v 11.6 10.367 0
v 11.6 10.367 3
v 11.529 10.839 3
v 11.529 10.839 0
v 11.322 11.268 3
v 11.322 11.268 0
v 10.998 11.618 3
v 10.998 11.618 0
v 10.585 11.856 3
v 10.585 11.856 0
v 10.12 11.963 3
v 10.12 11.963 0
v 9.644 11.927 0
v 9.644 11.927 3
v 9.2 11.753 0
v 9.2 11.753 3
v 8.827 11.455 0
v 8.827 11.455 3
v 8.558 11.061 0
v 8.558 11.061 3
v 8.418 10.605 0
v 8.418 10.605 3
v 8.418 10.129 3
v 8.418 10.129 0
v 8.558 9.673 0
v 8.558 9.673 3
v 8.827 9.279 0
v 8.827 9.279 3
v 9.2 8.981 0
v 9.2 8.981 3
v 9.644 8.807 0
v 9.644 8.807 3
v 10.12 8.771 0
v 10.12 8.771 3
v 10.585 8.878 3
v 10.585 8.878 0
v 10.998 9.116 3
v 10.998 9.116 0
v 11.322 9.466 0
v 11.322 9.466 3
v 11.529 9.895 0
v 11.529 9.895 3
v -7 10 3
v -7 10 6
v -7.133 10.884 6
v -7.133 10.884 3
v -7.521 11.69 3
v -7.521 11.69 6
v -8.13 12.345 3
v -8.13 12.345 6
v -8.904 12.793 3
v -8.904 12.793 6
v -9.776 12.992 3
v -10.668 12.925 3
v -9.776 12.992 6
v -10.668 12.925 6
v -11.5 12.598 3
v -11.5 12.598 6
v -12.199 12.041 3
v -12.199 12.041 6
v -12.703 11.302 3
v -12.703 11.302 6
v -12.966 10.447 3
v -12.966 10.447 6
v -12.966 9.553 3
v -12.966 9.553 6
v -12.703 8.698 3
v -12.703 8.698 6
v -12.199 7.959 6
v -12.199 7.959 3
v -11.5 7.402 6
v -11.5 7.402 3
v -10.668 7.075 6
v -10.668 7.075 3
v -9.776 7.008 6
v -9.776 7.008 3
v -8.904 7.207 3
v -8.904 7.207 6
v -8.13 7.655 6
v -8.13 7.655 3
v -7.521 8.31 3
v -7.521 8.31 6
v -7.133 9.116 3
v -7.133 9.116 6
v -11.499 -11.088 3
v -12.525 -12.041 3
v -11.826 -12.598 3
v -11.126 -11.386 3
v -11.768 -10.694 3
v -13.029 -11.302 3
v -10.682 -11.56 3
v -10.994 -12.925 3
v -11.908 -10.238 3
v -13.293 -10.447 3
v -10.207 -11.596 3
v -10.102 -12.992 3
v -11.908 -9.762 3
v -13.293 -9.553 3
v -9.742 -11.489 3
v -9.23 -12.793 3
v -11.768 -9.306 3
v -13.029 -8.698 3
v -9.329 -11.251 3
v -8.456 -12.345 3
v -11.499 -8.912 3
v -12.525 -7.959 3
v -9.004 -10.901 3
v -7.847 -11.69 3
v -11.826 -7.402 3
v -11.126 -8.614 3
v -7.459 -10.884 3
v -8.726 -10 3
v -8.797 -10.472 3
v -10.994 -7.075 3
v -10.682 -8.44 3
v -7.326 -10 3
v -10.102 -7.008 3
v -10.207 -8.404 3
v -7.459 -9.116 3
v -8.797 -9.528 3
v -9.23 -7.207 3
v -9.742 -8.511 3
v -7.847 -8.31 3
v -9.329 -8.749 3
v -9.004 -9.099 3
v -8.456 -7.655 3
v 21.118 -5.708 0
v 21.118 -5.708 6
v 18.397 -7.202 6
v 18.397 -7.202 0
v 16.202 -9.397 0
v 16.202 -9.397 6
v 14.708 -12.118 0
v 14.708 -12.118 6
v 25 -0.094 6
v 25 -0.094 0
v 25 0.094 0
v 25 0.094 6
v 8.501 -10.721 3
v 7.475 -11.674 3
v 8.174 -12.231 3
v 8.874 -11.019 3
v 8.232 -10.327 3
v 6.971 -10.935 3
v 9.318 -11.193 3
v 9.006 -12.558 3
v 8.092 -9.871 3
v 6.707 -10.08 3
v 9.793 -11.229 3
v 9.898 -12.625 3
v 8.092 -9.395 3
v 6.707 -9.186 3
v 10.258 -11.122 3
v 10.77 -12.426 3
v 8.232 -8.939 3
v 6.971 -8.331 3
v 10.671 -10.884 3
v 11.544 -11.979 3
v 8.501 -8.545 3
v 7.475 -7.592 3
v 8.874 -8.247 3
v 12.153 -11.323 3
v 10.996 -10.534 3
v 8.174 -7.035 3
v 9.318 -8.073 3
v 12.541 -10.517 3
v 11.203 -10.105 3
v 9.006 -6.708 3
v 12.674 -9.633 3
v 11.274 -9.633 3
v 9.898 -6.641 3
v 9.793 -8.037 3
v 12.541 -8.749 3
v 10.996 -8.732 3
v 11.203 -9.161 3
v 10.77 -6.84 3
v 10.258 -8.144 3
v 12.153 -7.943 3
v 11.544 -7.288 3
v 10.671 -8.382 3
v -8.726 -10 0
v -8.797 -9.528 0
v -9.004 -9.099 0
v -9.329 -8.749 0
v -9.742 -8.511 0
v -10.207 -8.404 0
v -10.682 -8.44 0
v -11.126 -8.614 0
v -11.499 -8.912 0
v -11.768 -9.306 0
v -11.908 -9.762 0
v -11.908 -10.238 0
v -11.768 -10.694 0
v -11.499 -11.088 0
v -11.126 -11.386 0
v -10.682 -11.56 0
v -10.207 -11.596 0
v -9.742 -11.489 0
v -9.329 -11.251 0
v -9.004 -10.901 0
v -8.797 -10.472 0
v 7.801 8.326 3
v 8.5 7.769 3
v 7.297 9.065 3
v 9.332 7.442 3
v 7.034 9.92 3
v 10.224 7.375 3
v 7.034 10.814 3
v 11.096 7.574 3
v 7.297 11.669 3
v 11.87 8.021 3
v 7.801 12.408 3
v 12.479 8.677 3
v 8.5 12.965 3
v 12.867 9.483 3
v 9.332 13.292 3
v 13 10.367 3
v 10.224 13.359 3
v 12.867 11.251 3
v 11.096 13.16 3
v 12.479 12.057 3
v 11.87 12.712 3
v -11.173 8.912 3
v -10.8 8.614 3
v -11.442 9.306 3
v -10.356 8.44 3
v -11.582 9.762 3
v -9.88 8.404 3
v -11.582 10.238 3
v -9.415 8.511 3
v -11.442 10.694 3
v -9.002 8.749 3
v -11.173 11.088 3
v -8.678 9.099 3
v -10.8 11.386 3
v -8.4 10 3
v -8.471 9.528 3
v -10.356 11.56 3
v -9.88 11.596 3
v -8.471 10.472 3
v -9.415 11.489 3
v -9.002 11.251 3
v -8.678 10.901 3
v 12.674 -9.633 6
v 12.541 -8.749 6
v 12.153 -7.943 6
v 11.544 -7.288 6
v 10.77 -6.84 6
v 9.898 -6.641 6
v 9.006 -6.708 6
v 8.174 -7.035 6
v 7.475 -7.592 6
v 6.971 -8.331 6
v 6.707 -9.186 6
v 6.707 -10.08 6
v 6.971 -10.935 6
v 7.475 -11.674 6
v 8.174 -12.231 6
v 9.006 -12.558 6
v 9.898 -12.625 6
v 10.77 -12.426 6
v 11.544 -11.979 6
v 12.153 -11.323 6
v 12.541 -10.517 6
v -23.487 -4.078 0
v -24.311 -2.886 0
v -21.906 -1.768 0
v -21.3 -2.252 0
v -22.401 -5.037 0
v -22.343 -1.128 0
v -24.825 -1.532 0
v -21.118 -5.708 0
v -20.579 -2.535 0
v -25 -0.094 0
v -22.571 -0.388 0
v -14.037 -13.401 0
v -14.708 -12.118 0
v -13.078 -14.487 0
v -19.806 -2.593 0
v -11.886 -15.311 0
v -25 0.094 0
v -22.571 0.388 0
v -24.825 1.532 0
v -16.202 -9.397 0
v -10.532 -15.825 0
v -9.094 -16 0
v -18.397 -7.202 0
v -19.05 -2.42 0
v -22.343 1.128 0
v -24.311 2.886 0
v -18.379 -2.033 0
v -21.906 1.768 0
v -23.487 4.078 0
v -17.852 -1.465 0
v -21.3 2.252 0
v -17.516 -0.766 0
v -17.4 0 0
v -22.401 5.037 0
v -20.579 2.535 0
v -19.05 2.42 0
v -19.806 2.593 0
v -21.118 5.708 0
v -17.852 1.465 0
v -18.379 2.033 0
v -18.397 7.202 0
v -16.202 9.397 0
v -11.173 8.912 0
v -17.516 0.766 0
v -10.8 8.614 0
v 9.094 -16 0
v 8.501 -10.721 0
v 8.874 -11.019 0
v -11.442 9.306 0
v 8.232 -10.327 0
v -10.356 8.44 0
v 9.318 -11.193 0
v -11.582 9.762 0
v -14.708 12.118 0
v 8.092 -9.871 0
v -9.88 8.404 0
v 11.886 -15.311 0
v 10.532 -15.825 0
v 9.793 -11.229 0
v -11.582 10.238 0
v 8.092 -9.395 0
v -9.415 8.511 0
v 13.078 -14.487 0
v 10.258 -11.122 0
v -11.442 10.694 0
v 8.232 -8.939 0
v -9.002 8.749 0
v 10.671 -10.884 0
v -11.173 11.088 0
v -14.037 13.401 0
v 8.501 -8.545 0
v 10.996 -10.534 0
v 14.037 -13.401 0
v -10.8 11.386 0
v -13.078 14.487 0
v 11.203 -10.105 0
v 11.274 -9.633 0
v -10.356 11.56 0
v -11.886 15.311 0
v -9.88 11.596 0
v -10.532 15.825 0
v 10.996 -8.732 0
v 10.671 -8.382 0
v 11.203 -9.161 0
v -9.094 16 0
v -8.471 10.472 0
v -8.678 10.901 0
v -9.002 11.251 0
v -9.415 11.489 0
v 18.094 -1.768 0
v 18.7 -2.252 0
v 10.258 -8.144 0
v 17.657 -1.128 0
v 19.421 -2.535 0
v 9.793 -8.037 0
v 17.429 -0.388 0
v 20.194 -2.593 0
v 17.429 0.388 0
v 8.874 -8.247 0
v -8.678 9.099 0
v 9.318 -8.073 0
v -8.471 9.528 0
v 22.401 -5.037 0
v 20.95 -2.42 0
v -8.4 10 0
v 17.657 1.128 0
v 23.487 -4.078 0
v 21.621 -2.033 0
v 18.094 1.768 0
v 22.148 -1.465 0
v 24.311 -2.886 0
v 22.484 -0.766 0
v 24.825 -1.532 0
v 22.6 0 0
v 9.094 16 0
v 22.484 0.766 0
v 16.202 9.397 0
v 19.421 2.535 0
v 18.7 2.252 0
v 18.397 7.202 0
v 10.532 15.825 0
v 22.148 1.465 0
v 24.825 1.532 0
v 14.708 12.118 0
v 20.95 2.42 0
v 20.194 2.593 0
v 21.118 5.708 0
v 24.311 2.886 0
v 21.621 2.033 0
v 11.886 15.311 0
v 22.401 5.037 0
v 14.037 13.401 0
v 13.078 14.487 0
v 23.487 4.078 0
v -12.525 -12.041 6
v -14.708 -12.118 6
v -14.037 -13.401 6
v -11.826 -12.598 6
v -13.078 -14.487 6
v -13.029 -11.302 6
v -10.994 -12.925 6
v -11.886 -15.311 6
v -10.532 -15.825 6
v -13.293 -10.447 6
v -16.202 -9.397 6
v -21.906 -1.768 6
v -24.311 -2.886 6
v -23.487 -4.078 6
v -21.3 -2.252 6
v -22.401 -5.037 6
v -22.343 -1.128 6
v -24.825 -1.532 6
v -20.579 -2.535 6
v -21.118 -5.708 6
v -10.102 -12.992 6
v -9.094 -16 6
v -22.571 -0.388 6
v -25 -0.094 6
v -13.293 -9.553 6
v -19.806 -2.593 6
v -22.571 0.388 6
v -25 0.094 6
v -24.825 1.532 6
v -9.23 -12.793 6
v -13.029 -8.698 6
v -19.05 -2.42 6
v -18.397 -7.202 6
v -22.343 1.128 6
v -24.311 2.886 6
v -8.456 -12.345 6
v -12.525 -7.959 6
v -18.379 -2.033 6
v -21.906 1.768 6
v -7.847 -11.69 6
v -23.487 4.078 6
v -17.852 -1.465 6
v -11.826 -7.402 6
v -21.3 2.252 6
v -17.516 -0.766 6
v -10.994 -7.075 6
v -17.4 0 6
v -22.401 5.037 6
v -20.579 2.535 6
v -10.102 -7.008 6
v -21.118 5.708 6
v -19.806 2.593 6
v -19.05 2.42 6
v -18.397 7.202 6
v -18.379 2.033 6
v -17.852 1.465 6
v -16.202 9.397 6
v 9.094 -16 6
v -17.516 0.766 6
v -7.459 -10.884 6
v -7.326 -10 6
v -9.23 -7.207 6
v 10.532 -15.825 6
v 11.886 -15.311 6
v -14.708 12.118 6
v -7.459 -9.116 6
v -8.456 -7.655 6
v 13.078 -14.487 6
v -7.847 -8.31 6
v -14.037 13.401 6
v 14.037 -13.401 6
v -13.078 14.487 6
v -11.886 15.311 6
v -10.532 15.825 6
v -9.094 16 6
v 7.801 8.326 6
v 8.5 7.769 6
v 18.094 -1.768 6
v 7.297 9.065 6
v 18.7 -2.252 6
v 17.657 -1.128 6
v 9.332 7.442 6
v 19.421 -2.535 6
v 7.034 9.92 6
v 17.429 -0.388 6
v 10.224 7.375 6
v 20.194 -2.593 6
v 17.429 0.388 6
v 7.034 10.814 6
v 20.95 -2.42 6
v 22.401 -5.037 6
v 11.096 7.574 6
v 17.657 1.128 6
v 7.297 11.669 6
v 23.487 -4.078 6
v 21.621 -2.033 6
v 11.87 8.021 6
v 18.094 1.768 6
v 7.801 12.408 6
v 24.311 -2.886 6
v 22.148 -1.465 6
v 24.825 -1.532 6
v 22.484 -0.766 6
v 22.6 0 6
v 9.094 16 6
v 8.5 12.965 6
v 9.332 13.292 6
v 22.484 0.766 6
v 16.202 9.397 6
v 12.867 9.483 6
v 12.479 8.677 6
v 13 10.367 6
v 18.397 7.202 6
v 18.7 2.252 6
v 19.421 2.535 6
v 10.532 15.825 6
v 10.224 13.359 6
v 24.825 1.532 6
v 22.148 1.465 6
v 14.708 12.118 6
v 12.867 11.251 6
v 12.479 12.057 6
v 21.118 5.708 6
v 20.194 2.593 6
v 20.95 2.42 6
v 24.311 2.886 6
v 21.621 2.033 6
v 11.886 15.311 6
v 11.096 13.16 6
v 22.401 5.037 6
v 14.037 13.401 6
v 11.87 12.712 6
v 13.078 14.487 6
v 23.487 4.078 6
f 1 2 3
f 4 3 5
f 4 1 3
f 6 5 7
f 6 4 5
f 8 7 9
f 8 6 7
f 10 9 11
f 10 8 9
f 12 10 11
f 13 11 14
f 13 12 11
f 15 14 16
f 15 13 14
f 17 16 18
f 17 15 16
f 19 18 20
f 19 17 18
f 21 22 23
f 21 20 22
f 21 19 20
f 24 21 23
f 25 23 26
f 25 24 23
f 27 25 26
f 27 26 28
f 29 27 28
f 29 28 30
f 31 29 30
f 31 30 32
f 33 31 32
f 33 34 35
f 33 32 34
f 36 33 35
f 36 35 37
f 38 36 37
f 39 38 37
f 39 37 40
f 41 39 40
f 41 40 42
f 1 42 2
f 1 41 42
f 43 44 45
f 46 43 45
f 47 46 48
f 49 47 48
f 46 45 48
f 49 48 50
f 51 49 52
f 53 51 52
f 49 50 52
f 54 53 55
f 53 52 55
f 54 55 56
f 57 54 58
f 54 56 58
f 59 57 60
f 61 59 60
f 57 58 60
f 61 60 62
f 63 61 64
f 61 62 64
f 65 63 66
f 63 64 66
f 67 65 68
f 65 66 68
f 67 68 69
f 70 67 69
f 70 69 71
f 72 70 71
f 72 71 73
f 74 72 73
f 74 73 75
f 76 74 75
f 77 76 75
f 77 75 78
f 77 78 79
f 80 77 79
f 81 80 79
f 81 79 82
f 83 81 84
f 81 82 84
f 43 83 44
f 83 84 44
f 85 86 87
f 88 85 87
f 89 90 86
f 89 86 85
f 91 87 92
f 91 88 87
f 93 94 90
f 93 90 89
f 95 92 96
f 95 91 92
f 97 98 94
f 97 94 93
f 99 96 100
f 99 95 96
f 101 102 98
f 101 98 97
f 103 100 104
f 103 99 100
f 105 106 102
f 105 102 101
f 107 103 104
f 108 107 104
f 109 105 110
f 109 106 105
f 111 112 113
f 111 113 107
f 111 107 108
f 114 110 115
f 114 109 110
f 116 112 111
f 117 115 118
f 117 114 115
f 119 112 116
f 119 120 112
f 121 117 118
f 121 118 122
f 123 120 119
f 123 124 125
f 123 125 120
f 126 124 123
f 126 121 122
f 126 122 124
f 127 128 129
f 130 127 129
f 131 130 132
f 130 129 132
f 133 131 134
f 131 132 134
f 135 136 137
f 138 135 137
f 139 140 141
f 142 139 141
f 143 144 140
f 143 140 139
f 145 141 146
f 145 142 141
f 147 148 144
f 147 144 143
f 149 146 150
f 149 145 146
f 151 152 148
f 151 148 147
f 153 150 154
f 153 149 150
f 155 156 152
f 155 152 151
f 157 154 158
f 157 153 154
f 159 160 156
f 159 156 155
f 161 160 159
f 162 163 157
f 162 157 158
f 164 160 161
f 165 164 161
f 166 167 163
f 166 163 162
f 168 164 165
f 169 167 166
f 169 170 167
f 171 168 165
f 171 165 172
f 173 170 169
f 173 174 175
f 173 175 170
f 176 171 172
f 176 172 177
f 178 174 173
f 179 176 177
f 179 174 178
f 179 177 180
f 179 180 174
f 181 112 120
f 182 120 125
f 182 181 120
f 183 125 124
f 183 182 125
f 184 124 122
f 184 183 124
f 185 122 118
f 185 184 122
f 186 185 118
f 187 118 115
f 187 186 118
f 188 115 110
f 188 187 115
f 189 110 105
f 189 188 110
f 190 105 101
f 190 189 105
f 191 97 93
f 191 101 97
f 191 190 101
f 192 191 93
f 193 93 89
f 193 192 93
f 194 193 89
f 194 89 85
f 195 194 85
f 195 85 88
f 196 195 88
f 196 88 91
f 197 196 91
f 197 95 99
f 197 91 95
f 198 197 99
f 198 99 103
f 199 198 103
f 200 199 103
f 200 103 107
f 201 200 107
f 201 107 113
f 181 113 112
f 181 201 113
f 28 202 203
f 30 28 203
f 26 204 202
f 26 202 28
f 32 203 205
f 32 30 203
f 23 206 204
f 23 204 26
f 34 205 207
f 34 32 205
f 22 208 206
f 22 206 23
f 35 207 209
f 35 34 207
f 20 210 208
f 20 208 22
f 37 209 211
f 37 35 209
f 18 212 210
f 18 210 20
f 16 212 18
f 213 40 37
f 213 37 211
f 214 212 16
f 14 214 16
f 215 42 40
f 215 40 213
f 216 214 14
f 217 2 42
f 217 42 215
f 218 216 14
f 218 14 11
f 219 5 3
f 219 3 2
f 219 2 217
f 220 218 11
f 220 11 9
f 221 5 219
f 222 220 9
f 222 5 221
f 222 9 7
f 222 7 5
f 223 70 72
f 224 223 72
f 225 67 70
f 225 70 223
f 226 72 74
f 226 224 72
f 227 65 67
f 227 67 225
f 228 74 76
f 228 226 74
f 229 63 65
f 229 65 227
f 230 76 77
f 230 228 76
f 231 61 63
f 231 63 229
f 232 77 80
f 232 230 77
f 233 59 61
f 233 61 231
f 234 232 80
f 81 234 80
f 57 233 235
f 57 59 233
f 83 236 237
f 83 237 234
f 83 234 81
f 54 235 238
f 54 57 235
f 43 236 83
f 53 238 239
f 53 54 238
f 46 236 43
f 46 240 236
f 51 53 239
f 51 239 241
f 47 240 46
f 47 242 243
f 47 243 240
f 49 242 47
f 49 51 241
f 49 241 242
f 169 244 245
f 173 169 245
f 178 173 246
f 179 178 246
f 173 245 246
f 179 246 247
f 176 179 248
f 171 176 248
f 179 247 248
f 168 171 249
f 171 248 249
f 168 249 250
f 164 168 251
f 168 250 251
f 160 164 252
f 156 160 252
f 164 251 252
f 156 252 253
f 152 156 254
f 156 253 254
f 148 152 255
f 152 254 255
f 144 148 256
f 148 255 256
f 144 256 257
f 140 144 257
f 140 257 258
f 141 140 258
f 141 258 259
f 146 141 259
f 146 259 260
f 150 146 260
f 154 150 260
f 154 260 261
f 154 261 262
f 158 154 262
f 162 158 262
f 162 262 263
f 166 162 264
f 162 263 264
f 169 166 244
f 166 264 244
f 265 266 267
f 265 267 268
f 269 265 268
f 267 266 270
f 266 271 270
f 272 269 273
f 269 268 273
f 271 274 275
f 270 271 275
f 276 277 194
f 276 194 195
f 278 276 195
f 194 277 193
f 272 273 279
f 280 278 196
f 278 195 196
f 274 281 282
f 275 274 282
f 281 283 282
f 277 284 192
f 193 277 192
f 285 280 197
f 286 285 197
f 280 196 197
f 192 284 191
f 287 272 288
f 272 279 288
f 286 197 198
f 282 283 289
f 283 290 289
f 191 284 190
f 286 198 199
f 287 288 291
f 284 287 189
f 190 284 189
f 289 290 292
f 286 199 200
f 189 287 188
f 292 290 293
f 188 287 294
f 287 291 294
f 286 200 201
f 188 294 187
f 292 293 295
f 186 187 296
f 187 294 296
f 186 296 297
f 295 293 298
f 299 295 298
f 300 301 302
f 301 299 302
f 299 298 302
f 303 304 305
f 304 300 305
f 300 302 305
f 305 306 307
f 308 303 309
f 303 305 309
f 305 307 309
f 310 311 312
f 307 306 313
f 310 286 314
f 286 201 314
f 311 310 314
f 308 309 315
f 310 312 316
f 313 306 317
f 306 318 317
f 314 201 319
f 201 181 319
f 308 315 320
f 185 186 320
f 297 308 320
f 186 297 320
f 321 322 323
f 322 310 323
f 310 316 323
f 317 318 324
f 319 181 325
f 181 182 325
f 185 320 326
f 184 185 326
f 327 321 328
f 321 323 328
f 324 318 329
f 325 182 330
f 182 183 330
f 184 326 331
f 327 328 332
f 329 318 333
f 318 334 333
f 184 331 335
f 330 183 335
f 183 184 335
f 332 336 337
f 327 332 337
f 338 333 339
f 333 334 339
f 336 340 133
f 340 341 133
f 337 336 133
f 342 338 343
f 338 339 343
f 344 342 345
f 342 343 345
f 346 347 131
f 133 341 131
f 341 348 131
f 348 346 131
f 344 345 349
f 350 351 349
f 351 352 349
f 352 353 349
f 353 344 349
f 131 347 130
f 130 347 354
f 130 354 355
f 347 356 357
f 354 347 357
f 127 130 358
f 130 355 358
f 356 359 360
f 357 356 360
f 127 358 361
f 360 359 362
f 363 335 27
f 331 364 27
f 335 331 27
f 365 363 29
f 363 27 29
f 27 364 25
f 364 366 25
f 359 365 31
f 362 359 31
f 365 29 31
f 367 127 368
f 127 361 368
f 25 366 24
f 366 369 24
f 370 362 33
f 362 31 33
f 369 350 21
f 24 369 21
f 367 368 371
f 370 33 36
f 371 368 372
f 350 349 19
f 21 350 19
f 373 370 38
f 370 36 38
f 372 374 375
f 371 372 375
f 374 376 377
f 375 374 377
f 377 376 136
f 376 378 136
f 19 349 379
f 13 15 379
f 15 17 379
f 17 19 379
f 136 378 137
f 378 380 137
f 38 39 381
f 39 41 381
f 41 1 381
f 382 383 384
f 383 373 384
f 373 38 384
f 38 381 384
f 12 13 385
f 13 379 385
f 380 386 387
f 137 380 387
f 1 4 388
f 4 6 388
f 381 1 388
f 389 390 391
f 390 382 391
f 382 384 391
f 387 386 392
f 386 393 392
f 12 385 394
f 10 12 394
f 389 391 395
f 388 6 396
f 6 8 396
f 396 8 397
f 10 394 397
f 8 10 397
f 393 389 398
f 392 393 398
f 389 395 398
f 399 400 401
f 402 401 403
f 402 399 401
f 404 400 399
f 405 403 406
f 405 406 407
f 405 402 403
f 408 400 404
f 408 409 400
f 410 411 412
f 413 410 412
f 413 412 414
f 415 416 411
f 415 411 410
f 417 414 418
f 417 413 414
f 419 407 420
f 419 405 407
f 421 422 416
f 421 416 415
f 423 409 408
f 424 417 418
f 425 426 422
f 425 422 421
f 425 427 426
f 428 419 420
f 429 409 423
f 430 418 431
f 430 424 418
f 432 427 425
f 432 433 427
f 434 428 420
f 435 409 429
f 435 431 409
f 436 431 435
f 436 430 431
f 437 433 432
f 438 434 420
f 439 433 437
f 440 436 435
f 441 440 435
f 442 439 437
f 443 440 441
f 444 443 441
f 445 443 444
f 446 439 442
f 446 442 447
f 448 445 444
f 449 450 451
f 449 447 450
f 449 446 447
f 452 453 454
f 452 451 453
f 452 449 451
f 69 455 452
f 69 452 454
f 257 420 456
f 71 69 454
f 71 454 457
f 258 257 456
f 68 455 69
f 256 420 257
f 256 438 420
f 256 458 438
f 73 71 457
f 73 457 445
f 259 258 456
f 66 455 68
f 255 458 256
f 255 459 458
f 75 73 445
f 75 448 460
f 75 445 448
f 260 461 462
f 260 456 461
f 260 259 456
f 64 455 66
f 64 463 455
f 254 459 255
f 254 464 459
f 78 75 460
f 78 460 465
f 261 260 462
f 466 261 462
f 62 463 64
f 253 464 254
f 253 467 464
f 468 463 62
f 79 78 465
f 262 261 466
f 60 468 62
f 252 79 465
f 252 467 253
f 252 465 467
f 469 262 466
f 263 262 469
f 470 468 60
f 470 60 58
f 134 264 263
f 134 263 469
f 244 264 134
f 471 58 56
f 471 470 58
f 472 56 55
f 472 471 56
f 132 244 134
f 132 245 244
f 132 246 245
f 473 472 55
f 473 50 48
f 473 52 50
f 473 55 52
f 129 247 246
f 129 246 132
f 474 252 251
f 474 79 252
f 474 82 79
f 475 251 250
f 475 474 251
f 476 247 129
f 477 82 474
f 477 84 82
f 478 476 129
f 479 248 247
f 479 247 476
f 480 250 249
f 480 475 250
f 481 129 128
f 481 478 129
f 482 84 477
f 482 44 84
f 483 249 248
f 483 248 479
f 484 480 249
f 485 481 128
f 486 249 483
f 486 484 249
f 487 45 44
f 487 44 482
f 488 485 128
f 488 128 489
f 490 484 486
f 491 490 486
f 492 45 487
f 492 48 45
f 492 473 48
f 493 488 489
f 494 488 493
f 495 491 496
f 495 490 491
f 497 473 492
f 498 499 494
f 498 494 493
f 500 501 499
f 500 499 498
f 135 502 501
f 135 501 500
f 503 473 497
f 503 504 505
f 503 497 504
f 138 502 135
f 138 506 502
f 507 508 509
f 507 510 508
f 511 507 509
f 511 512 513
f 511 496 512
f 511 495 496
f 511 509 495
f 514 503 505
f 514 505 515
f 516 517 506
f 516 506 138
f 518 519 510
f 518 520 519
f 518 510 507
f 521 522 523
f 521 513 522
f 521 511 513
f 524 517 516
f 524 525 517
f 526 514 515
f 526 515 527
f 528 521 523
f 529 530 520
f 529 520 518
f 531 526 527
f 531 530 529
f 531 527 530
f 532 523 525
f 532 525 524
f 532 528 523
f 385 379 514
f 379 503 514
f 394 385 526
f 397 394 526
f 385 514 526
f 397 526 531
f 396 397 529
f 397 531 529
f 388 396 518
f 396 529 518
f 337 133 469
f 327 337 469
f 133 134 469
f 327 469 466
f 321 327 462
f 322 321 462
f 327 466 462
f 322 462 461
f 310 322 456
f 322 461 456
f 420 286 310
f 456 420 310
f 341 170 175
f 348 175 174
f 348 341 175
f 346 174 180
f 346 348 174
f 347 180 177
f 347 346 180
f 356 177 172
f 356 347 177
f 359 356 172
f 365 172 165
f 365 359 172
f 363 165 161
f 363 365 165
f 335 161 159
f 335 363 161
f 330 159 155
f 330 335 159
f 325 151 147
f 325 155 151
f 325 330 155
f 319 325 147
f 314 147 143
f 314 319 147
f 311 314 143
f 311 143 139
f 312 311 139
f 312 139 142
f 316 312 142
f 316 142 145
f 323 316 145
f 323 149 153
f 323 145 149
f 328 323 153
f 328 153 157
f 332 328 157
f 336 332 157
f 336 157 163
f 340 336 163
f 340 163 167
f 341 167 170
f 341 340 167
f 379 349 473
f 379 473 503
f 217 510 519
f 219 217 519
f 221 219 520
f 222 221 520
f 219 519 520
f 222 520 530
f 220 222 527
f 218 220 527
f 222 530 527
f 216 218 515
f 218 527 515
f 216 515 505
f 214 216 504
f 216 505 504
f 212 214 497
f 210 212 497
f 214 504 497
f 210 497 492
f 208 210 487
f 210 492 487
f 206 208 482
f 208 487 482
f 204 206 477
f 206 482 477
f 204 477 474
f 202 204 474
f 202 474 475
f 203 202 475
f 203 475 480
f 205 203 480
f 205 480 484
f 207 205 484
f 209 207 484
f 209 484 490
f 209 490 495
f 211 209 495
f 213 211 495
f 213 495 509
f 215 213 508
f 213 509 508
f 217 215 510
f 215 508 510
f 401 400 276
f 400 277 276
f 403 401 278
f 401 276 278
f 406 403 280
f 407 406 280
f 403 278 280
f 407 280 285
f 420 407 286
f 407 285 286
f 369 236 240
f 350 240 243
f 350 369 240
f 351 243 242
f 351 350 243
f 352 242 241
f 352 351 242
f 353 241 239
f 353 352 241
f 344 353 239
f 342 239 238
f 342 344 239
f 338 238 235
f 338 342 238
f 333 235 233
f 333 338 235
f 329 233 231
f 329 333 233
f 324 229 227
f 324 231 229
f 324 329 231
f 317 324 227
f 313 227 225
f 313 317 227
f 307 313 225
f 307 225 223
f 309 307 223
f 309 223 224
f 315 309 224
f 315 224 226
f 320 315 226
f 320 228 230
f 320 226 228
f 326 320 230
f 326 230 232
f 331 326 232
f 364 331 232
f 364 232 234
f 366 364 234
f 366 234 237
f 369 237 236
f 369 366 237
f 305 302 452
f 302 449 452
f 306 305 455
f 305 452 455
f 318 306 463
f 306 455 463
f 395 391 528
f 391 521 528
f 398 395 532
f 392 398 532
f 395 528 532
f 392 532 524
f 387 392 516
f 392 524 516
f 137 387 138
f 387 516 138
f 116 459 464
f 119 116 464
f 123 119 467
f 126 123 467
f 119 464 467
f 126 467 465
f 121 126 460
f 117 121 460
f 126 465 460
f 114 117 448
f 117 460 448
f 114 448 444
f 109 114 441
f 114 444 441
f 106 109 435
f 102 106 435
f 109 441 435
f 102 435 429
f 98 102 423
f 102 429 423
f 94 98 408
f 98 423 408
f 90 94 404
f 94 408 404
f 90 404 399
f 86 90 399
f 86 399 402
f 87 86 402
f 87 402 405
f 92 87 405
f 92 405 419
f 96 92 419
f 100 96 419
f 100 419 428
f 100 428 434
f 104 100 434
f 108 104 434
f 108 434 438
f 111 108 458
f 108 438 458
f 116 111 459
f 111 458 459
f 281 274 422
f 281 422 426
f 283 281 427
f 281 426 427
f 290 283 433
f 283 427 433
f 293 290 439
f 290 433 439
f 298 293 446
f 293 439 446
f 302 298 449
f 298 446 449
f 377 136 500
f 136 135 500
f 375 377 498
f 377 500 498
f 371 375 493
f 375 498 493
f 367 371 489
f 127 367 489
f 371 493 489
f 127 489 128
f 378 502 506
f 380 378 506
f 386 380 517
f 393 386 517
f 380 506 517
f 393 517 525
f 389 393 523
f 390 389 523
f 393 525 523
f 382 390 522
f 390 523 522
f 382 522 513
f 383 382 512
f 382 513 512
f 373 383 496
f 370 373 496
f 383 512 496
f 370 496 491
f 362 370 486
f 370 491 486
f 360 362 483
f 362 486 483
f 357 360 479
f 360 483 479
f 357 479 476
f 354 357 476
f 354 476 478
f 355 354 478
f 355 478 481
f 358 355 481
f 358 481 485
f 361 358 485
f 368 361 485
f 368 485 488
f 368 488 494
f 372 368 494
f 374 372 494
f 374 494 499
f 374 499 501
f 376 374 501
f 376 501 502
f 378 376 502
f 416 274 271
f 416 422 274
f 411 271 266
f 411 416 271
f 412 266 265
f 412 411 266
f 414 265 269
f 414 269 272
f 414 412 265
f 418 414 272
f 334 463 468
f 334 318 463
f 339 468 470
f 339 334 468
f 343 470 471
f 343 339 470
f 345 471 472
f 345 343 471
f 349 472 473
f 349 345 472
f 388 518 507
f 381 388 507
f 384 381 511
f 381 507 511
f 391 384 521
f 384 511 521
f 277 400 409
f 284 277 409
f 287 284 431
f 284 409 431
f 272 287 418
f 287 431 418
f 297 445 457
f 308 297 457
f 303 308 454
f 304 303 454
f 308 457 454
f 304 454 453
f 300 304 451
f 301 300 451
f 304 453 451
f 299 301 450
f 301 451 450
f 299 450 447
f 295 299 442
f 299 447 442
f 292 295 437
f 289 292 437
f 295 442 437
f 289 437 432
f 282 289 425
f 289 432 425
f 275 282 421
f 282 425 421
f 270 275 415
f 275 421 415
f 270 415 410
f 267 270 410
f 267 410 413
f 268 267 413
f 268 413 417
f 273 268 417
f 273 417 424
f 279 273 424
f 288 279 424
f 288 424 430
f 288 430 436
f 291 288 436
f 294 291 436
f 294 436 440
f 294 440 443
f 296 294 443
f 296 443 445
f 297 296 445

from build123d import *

# Parameters (mm, degrees)
F0_W     = 50
F0_H     = 32
F0_R     = 1.6
F1_DEPTH = 6
F2_R     = 3
F3_DEPTH = 3
F4_R     = 2.6
F5_DEPTH = 25.4
F6_R     = 11
F7_DEPTH = 25.4
F8_R     = 6


with BuildPart() as f1:
    # F0 (on Top) → F1 (new body)
    with BuildSketch(Plane.XY):
        Rectangle(F0_W, F0_H)
        with Locations((-10.3261368227, -10)):
            Circle(F0_R, mode=Mode.SUBTRACT)
        with Locations((9.6738631773, -9.6330129863)):
            Circle(F0_R, mode=Mode.SUBTRACT)
        with Locations((-10, 10)):
            Circle(F0_R, mode=Mode.SUBTRACT)
        with Locations((10, 10.3669870137)):
            Circle(F0_R, mode=Mode.SUBTRACT)
    extrude(amount=F1_DEPTH)

    # F2 (on face) → F3 (cut)
    with BuildSketch(Plane.XY.offset(6)):
        with Locations((-10, 10)):
            Circle(F2_R)
        with Locations((-10.3261368227, -10)):
            Circle(F2_R)
        with Locations((9.6738631773, -9.6330129863)):
            Circle(F2_R)
        with Locations((10, 10.3669870137)):
            Circle(F2_R)
    extrude(amount=-F3_DEPTH, mode=Mode.SUBTRACT)

    # F4 (on face) → F5 (cut)
    with BuildSketch(Plane.XY.offset(6)):
        with Locations((-20, 0)):
            Circle(F4_R)
        with Locations((20, 0)):
            Circle(F4_R)
    extrude(amount=-F5_DEPTH, mode=Mode.SUBTRACT)

    # F6 (on face) → F7 (cut)
    with BuildSketch(Plane.XY.offset(6)):
        with Locations((-25, 16)):
            Circle(F6_R)
        with Locations((25, 16)):
            Circle(F6_R)
        with Locations((25, -16)):
            Circle(F6_R)
        with Locations((-25, -16)):
            Circle(F6_R)
    extrude(amount=-F7_DEPTH, mode=Mode.SUBTRACT)

    # F8
    f8_edges = [f1.edges().sort_by_distance(p)[0] for p in [
        (-14, -16, 3),
        (-25, -5, 3),
        (14, -16, 3),
        (25, -5, 3),
        (25, 5, 3),
        (14, 16, 3),
        (-14, 16, 3),
        (-25, 5, 3),
    ]]
    fillet(f8_edges, radius=F8_R)


solid = f1.part
